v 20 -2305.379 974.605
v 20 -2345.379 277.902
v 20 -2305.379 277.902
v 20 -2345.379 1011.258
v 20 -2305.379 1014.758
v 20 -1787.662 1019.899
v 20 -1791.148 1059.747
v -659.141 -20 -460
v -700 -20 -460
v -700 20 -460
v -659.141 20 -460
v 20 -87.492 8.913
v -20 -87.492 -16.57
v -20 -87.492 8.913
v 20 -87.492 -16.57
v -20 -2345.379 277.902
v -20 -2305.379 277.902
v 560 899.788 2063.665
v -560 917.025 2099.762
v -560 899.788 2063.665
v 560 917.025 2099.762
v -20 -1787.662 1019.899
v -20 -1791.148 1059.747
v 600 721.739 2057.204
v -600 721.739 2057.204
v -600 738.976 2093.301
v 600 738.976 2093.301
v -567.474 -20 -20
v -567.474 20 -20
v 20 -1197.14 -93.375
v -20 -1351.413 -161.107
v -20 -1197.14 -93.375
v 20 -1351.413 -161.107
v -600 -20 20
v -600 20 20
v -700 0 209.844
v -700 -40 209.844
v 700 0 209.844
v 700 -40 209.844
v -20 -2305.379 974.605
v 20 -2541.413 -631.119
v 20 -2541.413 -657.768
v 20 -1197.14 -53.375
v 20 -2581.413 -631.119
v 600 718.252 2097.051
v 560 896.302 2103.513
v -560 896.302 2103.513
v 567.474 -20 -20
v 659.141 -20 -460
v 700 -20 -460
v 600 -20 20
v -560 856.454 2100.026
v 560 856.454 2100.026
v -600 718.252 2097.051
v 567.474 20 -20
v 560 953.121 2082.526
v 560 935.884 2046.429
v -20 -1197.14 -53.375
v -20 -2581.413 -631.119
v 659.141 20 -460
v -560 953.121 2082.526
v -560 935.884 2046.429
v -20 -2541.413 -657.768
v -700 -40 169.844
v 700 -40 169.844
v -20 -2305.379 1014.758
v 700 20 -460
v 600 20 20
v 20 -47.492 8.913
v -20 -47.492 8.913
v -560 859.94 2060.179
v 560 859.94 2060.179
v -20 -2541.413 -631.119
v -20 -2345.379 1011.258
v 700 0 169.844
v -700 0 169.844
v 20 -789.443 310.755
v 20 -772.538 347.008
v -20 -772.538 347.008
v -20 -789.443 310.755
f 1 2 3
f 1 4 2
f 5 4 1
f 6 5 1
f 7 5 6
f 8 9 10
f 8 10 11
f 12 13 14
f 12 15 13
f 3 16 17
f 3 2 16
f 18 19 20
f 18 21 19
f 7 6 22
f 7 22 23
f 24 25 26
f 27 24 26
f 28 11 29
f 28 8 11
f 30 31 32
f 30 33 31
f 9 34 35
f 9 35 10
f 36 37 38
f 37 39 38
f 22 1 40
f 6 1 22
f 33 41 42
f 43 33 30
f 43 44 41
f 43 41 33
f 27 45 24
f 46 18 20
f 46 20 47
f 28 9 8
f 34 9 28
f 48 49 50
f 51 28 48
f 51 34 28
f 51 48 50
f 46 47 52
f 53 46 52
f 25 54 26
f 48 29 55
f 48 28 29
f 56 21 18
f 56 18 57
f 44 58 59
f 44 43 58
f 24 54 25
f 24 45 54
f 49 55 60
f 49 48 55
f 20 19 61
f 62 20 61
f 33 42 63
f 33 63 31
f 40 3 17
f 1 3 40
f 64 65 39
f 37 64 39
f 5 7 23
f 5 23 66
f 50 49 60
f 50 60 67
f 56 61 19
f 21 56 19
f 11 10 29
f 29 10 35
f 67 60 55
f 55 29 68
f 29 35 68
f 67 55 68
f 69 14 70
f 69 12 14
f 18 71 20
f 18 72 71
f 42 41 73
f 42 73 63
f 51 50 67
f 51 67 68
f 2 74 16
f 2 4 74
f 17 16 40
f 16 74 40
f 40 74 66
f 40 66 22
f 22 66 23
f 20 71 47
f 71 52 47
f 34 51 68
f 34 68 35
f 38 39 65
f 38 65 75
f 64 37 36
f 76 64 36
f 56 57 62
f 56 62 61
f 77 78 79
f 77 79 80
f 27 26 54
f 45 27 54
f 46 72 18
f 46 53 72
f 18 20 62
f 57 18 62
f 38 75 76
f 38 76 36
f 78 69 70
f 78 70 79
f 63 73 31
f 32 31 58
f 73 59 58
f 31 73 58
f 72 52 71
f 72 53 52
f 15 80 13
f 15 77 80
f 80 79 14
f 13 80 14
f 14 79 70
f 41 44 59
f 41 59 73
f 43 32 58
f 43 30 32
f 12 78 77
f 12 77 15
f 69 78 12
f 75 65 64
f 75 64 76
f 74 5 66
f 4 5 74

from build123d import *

# Parameters (mm, degrees)
F2_DEPTH  = 20
F4_DEPTH  = 20
F6_DEPTH  = 600
F8_DEPTH  = 560
F10_DEPTH = 20
F11_W     = 40
F11_H     = 40
F12_DEPTH = 700
F14_DEPTH = 20


with BuildPart() as f2:
    # F1 (on Front) → F2 (new body, symmetric)
    with BuildSketch(Plane.XZ):
        Polygon((600, 20), (600, -20), (567.474498, -20), (659.141164, -460), (700, -460), align=None)
        Polygon((567.474498, -20), (600, -20), (600, 20), (-600, 20), (-600, -20), (-567.474498, -20), align=None)
        Polygon((-659.141164, -460), (-567.474498, -20), (-600, -20), (-600, 20), (-700, -460), align=None)
    extrude(amount=F2_DEPTH, both=True)


with BuildPart() as f4:
    # F3 (on Right) → F4 (new body, symmetric)
    with BuildSketch(Plane.YZ):
        Polygon((-87.491836, 8.913082), (-47.491836, 8.913082), (-772.538066, 347.007692), (-789.442796, 310.75538), (-87.491836, -16.569728), align=None)
    extrude(amount=F4_DEPTH, both=True)


with BuildPart() as f6:
    # F5 (on Right) → F6 (new body, symmetric)
    with BuildSketch(Plane.YZ):
        Polygon((718.252358, 2097.051479), (721.738588, 2057.203691), (738.975539, 2093.301085), align=None)
    extrude(amount=F6_DEPTH, both=True)


with BuildPart() as f8:
    # F7 (on face) → F8 (new body, symmetric)
    with BuildSketch(Plane.YZ):
        Polygon((859.940185, 2060.178605), (899.787973, 2063.664835), (896.301743, 2103.512622), (856.453955, 2100.026393), align=None)
        Polygon((917.024925, 2099.762229), (899.787973, 2063.664835), (935.883852, 2046.428607), (953.120803, 2082.526001), align=None)
    extrude(amount=F8_DEPTH, both=True)


with BuildPart() as f10:
    # F9 (on Right) → F10 (new body, symmetric)
    with BuildSketch(Plane.YZ):
        Polygon((-2345.378719, 971.105368), (-2345.378719, 277.902052), (-2305.378719, 277.902052), (-2305.378719, 974.604915), align=None)
        Polygon((-2345.378719, 1011.258162), (-2345.378719, 971.105368), (-2305.378719, 974.604915), (-2305.378719, 1014.757708), align=None)
        Polygon((-2305.378719, 1014.757708), (-2305.378719, 974.604915), (-1787.6619, 1019.899268), (-1791.14813, 1059.747055), align=None)
    extrude(amount=F10_DEPTH, both=True)


with BuildPart() as f12:
    # F11 (on Right) → F12 (new body, symmetric)
    with BuildSketch(Plane.YZ):
        with Locations((-20, 189.844121)):
            Rectangle(F11_W, F11_H)
    extrude(amount=F12_DEPTH, both=True)


with BuildPart() as f14:
    # F13 (on Right) → F14 (new body, symmetric)
    with BuildSketch(Plane.YZ):
        Polygon((-1197.13988, -53.37465), (-2581.412954, -631.118586), (-2541.412954, -631.118586), (-2541.412954, -657.768127), (-1351.412954, -161.106525), (-1197.13988, -93.37465), align=None)
    extrude(amount=F14_DEPTH, both=True)


solid = Compound([f2.part, f4.part, f6.part, f8.part, f10.part, f12.part, f14.part])
